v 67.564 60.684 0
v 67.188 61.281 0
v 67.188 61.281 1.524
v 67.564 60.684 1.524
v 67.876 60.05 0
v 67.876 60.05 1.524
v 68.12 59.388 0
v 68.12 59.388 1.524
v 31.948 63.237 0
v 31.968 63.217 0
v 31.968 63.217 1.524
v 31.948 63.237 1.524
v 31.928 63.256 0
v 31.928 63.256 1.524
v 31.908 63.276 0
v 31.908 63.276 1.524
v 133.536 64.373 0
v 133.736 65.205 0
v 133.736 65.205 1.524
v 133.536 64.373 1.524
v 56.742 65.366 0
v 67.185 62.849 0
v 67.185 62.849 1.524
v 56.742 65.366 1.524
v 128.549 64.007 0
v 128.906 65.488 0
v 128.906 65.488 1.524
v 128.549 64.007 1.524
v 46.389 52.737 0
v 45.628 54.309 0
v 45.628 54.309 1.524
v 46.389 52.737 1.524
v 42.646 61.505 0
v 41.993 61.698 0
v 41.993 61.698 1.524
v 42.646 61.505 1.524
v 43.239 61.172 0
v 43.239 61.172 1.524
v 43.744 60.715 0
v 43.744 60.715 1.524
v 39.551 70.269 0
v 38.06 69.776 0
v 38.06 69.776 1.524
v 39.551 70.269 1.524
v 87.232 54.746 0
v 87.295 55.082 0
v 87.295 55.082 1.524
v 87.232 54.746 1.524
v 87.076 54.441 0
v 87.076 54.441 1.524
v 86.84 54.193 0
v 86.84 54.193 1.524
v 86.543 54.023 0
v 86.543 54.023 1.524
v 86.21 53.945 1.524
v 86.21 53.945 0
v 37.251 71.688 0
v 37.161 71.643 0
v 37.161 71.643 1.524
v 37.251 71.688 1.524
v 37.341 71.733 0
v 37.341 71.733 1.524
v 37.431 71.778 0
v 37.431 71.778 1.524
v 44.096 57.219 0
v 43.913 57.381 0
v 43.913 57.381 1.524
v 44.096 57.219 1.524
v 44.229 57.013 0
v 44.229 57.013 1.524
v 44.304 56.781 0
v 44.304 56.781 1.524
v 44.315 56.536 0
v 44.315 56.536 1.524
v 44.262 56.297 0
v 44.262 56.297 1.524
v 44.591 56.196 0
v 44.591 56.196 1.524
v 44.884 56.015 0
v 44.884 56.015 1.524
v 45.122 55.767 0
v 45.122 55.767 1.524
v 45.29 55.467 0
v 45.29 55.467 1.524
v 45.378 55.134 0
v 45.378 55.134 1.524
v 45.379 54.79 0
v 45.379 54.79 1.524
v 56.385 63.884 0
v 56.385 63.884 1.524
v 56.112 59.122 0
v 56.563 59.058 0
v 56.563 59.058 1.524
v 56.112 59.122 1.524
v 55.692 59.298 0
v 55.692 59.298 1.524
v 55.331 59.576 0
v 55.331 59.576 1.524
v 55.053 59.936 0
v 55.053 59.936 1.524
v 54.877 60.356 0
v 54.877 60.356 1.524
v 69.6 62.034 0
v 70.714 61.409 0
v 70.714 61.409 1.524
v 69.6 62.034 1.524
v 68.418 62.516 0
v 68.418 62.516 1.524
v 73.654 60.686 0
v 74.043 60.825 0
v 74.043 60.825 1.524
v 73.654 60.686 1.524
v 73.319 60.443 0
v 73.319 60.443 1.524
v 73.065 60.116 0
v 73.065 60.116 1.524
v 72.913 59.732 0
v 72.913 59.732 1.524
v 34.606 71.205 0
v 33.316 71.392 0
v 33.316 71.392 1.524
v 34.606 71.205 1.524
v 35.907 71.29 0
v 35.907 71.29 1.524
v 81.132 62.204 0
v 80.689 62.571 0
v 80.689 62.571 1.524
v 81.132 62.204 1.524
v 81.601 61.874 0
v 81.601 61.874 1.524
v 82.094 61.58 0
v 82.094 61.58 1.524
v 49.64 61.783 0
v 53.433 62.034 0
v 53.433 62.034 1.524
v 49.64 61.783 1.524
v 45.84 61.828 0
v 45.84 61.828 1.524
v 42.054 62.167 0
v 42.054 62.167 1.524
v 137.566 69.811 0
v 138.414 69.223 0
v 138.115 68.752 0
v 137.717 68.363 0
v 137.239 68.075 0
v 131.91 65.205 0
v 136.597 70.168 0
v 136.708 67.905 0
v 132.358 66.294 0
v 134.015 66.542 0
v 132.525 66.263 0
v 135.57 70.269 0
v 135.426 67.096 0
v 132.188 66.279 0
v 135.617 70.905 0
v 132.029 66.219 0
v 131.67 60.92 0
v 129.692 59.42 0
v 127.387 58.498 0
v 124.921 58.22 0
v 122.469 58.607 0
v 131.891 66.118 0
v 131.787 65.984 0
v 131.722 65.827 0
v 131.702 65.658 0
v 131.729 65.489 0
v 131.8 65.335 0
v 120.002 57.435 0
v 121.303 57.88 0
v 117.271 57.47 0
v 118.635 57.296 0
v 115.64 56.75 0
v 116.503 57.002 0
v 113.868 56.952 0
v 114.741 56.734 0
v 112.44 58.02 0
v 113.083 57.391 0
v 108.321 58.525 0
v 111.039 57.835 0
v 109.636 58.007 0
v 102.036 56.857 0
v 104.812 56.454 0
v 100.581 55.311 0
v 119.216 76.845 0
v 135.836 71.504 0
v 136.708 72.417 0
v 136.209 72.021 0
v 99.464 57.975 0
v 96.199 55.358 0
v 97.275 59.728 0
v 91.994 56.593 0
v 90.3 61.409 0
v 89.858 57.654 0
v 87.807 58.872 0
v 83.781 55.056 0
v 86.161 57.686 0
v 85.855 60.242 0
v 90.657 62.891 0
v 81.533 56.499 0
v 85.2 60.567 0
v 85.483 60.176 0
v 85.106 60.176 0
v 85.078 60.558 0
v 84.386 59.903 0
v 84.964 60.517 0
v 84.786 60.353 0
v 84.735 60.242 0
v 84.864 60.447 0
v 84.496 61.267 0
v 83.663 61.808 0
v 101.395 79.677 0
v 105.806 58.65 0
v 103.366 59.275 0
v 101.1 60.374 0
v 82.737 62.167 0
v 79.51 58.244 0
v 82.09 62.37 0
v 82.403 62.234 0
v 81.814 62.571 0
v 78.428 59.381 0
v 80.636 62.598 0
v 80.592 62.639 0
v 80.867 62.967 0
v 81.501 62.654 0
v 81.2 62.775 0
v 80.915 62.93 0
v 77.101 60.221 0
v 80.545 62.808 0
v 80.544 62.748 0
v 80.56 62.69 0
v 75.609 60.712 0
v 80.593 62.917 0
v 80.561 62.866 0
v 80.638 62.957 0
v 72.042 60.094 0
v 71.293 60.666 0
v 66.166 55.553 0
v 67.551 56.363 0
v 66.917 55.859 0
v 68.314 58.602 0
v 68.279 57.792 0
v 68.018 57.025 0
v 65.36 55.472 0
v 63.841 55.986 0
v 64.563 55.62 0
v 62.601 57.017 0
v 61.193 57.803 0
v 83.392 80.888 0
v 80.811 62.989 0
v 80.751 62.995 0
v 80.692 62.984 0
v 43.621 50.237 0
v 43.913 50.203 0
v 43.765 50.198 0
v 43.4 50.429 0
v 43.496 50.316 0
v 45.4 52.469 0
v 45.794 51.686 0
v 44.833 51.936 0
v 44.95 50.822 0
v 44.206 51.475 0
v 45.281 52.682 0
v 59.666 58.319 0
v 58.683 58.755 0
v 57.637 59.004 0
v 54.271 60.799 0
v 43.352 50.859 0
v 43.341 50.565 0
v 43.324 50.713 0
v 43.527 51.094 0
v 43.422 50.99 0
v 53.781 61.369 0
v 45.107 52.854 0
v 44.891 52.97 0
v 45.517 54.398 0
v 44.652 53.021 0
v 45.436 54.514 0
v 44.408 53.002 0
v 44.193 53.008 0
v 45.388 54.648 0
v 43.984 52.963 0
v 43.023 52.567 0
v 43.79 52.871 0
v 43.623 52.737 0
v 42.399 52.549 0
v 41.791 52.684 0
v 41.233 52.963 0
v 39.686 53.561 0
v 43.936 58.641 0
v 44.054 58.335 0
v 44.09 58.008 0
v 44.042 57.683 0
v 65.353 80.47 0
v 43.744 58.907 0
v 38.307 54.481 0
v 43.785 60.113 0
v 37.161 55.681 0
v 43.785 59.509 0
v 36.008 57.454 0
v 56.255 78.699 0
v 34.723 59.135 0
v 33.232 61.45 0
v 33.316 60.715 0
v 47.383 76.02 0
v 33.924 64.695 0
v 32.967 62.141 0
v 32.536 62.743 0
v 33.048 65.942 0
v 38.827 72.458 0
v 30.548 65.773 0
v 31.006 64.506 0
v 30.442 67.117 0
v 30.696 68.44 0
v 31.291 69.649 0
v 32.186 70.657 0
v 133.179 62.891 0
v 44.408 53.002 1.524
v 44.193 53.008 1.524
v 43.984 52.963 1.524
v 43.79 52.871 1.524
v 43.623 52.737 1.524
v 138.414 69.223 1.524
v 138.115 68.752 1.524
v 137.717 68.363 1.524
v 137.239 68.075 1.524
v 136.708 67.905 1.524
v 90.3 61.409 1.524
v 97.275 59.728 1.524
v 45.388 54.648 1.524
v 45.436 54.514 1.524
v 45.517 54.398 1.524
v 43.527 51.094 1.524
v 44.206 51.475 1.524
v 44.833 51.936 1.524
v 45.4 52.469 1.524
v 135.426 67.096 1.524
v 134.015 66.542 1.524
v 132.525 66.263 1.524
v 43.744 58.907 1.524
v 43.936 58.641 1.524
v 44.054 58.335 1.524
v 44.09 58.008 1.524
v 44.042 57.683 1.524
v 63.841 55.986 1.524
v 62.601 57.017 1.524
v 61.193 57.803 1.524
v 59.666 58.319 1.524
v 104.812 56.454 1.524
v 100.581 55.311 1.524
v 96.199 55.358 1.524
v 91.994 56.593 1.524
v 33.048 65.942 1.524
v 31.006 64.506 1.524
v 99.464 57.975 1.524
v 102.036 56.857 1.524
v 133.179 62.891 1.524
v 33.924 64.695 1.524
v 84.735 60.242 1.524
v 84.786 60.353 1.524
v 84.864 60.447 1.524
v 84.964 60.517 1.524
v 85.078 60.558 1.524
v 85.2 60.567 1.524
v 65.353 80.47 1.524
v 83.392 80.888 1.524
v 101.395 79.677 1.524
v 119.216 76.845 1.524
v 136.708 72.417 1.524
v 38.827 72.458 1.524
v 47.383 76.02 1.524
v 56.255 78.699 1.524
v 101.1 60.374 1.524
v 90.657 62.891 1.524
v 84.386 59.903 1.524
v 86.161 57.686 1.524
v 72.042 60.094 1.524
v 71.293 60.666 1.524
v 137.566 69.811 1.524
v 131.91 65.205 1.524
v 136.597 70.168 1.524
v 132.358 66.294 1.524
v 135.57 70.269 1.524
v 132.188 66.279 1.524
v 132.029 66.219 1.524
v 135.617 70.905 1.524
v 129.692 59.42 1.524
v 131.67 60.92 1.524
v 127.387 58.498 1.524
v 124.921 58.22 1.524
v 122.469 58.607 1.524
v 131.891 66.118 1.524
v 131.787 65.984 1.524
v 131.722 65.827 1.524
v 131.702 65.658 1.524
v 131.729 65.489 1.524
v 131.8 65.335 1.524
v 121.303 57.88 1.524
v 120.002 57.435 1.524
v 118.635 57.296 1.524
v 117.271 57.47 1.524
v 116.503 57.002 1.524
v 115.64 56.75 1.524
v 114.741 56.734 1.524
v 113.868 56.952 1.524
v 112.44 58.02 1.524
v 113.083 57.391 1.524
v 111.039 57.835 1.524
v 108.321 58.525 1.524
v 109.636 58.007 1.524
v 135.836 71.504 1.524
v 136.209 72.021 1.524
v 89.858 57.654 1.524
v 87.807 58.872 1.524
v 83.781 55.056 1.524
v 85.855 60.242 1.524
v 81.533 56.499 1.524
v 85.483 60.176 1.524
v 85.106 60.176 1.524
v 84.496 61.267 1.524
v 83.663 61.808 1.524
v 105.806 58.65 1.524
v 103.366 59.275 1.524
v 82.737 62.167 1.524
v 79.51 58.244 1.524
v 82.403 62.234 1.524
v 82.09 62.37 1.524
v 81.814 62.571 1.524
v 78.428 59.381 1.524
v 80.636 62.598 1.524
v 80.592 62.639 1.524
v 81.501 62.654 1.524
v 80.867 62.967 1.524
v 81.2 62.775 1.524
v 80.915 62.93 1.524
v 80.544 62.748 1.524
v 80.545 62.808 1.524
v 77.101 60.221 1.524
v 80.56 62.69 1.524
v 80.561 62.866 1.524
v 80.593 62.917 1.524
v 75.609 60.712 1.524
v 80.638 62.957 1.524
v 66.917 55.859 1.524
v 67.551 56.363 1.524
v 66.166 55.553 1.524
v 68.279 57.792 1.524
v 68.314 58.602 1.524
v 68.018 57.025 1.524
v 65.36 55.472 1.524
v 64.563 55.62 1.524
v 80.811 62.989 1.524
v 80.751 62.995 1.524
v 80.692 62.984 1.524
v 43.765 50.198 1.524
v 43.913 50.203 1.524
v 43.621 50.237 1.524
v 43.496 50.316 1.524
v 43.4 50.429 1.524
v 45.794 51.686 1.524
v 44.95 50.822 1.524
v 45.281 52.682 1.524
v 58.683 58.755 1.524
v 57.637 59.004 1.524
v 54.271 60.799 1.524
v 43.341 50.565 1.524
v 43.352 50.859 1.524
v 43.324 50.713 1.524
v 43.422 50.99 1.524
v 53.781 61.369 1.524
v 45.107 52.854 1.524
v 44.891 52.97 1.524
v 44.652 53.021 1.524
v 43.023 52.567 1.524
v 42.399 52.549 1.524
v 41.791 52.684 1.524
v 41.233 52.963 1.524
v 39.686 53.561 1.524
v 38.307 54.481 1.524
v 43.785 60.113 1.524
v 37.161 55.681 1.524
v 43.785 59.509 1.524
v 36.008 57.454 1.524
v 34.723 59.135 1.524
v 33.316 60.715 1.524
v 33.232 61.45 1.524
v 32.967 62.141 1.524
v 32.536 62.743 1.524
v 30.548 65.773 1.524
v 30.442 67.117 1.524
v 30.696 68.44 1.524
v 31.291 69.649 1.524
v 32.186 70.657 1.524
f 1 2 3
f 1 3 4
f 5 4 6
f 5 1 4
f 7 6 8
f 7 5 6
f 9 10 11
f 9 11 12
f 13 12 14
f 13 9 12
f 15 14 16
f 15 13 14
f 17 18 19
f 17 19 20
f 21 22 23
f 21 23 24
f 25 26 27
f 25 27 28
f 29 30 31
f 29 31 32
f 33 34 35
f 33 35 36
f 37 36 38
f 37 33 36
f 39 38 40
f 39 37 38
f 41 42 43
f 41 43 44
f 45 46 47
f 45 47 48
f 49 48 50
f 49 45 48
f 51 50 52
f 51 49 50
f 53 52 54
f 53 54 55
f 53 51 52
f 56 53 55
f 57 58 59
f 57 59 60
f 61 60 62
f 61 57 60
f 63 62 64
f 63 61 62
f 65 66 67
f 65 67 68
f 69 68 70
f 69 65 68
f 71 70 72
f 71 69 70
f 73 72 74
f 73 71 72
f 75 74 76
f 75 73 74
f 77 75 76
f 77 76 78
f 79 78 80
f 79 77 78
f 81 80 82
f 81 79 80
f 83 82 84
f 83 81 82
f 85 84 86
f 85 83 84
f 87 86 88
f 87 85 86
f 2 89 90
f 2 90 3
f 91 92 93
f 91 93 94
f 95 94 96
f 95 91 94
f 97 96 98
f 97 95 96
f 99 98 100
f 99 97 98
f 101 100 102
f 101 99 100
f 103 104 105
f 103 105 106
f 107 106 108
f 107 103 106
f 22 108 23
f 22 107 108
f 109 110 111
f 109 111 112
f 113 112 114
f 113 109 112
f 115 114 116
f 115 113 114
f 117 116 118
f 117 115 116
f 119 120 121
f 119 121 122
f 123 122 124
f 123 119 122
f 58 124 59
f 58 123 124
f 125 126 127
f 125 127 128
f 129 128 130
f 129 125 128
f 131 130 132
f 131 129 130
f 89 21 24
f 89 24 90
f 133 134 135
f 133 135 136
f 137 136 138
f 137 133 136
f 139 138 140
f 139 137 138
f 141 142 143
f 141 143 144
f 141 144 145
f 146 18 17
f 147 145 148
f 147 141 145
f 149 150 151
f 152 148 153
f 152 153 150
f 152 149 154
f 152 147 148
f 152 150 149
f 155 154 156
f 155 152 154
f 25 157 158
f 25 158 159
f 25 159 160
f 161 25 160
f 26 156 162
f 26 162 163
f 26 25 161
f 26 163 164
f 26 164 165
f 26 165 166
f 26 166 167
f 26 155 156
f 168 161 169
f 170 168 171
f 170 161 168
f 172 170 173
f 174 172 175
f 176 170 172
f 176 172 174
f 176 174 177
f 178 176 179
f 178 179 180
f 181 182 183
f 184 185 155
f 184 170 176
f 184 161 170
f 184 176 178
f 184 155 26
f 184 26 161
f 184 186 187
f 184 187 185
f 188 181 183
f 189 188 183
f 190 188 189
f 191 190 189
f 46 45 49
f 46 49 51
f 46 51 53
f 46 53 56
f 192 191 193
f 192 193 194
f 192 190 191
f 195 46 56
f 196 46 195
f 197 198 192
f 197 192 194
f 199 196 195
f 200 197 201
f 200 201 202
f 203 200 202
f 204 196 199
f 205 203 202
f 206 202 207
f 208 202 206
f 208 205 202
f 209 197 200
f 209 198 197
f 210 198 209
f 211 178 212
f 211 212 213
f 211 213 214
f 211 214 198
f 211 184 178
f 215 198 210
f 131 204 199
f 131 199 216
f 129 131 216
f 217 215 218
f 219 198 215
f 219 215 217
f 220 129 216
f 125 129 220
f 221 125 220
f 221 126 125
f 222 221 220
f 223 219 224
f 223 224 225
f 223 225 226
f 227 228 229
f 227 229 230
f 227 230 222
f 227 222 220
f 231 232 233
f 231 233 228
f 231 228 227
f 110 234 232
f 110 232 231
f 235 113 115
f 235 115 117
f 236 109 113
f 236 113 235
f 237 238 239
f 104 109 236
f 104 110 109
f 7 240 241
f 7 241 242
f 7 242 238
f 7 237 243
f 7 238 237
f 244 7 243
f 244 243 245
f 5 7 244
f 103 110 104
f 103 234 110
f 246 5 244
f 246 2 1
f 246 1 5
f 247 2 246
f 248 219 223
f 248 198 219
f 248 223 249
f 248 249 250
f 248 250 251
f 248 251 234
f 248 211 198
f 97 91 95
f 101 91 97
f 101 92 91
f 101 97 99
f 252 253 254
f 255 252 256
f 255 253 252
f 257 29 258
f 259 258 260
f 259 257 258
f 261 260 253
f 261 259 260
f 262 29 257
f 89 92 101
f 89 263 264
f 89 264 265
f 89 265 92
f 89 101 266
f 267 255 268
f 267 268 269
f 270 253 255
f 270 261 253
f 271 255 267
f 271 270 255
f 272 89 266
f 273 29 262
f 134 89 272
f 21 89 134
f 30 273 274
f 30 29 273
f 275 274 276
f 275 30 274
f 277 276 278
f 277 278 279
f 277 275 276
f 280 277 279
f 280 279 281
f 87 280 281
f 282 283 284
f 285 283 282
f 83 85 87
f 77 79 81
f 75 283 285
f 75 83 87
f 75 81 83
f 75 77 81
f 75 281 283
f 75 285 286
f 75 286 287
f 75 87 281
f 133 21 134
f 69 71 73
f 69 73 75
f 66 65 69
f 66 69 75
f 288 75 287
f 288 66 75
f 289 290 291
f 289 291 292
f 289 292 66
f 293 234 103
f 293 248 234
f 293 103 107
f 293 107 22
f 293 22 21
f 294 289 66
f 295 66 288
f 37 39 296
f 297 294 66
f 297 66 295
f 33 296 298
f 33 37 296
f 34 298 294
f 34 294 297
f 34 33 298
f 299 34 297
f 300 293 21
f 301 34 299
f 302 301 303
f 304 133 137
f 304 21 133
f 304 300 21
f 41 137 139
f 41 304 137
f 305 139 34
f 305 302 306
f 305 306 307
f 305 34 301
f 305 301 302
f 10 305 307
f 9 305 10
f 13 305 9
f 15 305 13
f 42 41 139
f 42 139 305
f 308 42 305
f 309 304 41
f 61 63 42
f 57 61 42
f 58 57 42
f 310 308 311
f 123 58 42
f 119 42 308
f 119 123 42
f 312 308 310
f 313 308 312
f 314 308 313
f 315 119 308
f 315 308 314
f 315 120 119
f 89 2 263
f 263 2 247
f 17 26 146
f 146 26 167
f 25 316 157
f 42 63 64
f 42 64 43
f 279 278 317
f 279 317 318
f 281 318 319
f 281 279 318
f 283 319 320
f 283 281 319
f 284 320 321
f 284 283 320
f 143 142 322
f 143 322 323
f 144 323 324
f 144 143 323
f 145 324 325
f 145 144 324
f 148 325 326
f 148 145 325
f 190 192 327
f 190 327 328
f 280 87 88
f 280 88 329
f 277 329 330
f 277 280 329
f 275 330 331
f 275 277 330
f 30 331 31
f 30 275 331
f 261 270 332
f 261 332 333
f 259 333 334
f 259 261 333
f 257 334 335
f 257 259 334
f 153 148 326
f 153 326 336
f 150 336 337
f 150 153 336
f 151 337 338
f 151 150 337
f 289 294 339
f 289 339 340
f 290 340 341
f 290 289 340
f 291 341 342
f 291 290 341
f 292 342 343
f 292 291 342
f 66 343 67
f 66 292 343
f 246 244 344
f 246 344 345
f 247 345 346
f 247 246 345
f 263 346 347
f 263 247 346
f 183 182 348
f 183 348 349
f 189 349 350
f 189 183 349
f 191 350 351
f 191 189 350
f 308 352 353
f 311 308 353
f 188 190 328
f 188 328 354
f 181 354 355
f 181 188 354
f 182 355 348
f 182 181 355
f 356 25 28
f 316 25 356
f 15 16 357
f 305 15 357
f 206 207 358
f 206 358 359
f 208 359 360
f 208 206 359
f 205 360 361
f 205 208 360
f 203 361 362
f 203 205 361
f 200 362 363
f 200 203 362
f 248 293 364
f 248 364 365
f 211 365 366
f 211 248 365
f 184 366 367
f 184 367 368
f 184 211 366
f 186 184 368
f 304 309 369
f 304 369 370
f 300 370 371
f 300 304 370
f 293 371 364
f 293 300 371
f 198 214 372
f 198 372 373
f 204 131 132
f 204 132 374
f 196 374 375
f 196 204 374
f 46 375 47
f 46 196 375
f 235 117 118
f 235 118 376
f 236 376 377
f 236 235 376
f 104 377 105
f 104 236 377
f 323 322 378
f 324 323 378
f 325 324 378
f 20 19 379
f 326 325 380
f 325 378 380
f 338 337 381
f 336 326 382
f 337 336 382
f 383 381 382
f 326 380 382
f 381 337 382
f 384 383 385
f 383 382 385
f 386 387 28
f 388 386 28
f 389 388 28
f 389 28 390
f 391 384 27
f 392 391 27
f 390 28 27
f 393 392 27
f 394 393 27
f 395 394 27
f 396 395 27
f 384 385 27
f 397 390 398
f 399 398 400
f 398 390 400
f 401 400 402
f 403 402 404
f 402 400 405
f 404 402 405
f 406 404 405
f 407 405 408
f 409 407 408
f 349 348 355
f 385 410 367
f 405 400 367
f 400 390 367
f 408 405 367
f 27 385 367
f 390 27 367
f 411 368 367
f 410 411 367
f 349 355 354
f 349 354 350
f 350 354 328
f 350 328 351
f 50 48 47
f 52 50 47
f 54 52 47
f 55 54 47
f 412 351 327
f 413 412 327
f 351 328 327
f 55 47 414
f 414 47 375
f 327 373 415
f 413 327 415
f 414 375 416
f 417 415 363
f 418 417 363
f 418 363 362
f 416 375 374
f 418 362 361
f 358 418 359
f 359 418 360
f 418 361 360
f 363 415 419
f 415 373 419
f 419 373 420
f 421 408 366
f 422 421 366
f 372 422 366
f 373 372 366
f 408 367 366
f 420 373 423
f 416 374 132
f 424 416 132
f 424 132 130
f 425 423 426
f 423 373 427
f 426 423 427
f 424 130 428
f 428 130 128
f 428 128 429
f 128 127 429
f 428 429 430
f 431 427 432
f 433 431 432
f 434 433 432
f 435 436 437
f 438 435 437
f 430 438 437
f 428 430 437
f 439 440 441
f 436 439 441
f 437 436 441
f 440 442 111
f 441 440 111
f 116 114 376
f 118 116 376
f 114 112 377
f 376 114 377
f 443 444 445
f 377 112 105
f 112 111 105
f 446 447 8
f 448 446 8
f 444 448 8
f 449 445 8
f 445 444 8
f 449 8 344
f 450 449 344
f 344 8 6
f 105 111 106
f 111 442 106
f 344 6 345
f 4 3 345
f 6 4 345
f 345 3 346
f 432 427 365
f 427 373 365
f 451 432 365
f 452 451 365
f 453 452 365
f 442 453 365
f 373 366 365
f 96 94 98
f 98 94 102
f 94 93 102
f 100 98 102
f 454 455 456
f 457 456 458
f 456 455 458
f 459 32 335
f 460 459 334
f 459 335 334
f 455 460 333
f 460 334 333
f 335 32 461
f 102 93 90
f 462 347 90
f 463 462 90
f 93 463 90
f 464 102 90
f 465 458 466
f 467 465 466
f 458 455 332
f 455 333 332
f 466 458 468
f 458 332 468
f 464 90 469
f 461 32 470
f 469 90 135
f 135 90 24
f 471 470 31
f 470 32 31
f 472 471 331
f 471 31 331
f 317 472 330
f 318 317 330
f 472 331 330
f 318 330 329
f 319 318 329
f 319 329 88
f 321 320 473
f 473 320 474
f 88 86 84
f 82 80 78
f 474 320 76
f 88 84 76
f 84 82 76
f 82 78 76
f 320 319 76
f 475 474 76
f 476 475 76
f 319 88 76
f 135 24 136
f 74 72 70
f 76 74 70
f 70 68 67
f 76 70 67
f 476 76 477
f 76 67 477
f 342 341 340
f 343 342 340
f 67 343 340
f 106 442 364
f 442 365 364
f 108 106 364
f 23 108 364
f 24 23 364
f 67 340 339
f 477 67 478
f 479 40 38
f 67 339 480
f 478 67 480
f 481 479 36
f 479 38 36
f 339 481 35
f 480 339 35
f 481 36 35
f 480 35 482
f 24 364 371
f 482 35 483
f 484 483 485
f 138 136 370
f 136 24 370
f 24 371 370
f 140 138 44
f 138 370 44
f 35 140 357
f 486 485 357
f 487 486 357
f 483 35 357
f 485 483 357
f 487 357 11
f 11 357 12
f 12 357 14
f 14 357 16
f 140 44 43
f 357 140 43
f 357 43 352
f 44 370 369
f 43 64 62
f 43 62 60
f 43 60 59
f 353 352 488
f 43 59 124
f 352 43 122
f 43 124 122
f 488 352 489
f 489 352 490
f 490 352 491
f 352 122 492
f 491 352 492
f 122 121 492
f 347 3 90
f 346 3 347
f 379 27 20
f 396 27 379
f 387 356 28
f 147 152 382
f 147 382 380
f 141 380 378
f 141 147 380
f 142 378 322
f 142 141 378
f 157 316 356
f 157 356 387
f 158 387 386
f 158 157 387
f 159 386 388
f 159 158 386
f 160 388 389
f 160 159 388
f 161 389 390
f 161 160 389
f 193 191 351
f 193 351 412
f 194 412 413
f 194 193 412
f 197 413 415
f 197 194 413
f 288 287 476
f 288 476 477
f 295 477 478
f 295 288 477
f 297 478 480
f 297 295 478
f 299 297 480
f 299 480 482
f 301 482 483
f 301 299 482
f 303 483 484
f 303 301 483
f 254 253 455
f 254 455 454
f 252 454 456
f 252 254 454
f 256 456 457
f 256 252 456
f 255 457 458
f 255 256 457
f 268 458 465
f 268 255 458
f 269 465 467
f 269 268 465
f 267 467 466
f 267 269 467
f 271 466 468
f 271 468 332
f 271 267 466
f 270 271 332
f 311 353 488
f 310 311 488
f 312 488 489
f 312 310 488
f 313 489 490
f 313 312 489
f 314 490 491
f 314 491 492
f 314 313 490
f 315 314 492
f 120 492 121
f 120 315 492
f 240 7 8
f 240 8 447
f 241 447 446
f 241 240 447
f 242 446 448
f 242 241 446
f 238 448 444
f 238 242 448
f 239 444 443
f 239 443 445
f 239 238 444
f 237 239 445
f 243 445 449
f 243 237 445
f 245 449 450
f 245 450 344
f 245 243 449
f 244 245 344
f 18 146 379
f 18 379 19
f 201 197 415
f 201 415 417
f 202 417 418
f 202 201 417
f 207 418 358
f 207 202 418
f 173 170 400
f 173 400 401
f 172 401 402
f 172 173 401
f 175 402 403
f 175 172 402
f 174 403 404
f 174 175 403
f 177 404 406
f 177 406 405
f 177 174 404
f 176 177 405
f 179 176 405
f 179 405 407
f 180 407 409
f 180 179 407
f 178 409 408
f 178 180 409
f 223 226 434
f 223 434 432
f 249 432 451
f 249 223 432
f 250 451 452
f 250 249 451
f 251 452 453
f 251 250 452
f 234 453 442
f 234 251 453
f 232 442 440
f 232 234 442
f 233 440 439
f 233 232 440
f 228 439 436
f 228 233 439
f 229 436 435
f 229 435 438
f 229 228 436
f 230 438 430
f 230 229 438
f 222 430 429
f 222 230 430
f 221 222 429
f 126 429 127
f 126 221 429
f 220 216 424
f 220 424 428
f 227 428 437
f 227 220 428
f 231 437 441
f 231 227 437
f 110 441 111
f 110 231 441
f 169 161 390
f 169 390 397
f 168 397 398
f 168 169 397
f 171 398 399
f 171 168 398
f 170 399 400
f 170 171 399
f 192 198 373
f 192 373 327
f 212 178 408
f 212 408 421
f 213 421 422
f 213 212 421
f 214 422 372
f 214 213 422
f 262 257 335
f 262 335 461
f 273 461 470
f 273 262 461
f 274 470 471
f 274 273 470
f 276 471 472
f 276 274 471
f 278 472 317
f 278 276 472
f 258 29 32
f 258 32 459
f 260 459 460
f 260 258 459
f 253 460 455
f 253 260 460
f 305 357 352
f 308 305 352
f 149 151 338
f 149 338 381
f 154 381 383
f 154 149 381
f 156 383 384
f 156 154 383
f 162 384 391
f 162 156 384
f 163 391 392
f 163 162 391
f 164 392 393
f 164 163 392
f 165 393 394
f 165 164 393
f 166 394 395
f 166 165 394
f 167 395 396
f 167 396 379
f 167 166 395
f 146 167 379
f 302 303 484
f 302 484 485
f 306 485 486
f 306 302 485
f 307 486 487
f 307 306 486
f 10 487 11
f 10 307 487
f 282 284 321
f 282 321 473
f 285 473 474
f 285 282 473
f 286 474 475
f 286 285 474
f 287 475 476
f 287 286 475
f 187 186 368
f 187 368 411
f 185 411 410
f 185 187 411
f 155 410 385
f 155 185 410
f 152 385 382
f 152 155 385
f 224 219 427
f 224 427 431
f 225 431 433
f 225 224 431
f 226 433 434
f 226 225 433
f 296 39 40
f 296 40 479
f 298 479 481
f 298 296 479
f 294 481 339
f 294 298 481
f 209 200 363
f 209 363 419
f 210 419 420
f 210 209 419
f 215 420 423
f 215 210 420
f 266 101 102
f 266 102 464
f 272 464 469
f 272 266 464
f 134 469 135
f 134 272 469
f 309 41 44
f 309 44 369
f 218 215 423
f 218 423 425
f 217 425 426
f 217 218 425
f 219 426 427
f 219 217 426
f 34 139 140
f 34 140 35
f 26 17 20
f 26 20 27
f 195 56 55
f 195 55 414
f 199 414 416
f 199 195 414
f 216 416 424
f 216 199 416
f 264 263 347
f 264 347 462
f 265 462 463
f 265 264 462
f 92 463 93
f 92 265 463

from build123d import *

# Parameters (mm, degrees)
BOSS_EXTRUDE1_DEPTH = 1.524
CUT_EXTRUDE1_DEPTH  = 1.524


with BuildPart() as part:
    # Sketch1 → Boss-Extrude1 (new body)
    with BuildSketch(Plane.XY):
        with BuildLine():
            Line((101.100291423, 60.374270727), (90.656589002, 62.891021845))
            Line((90.656589002, 62.891021845), (90.299552181, 61.409434619))
            Line((90.299552181, 61.409434619), (97.275281594, 59.728404837))
            ThreePointArc((97.275281594, 59.728404837), (100.712861052, 57.330103102), (104.811716554, 56.453640143))
            ThreePointArc((104.811716554, 56.453640143), (98.388387768, 55.183939277), (91.99420693, 56.593103707))
            ThreePointArc((91.99420693, 56.593103707), (88.820887917, 58.243640163), (85.854606826, 60.242489993))
            ThreePointArc((85.854606826, 60.242489993), (85.294961905, 60.16786255), (84.735316985, 60.242489993))
            ThreePointArc((84.735316985, 60.242489993), (84.911389048, 60.485248679), (85.199998696, 60.566720278))
            ThreePointArc((85.199998696, 60.566720278), (84.093704885, 61.559355838), (82.737345027, 62.167220368))
            ThreePointArc((82.737345027, 62.167220368), (82.242631079, 62.293353709), (81.813901616, 62.570558609))
            ThreePointArc((81.813901616, 62.570558609), (81.348307425, 62.709827468), (80.915148386, 62.930161332))
            ThreePointArc((80.915148386, 62.930161332), (80.575687035, 62.892592479), (80.689439461, 62.570558609))
            ThreePointArc((80.689439461, 62.570558609), (81.362910423, 62.034486044), (82.093679171, 61.579608074))
            ThreePointArc((82.093679171, 61.579608074), (85.34723108, 58.853595342), (87.294585764, 55.08204988))
            ThreePointArc((87.294585764, 55.08204988), (86.96715778, 54.308537604), (86.2100149, 53.944855072))
            ThreePointArc((86.2100149, 53.944855072), (82.631314085, 55.737501843), (79.510424358, 58.243640163))
            ThreePointArc((79.510424358, 58.243640163), (77.101022334, 60.220982956), (74.043252382, 60.8252557))
            ThreePointArc((74.043252382, 60.8252557), (73.319039981, 60.442919356), (72.912598281, 59.731955343))
            ThreePointArc((72.912598281, 59.731955343), (71.649210609, 60.355874406), (70.713564157, 61.409434619))
            ThreePointArc((70.713564157, 61.409434619), (69.01653018, 62.293413679), (67.185483534, 62.848941789))
            Line((67.185483534, 62.848941789), (56.741781112, 65.365692908))
            Line((56.741781112, 65.365692908), (56.384744292, 63.884105681))
            Line((56.384744292, 63.884105681), (67.187541645, 61.280818914))
            ThreePointArc((67.187541645, 61.280818914), (67.728064625, 60.371118212), (68.120097106, 59.388249456))
            ThreePointArc((68.120097106, 59.388249456), (67.25174991, 56.088088151), (63.840774779, 55.986401624))
            ThreePointArc((63.840774779, 55.986401624), (61.915192799, 57.442438875), (59.66587196, 58.319060916))
            ThreePointArc((59.66587196, 58.319060916), (58.165438165, 58.903580474), (56.56257634, 59.057848613))
            ThreePointArc((56.56257634, 59.057848613), (55.502751345, 59.425253798), (54.876523852, 60.355874406))
            ThreePointArc((54.876523852, 60.355874406), (54.009369491, 61.07018483), (53.432898123, 62.034486044))
            ThreePointArc((53.432898123, 62.034486044), (47.739513392, 61.768563203), (42.053880875, 62.167220368))
            Line((42.053880875, 62.167220368), (41.993373858, 61.698351986))
            ThreePointArc((41.993373858, 61.698351986), (42.952167328, 61.355476536), (43.743732957, 60.714951479))
            ThreePointArc((43.743732957, 60.714951479), (43.790697856, 59.811147629), (43.743732957, 58.907343779))
            ThreePointArc((43.743732957, 58.907343779), (44.082816136, 58.172570857), (43.912857263, 57.381380215))
            ThreePointArc((43.912857263, 57.381380215), (44.274457866, 56.899495102), (44.262024663, 56.297154937))
            ThreePointArc((44.262024663, 56.297154937), (45.122173078, 55.767110933), (45.378894328, 54.789923059))
            ThreePointArc((45.378894328, 54.789923059), (45.435502491, 54.514155378), (45.627787771, 54.308537604))
            Line((45.627787771, 54.308537604), (46.389355044, 52.737014998))
            ThreePointArc((46.389355044, 52.737014998), (45.400171695, 51.226760005), (43.912857263, 50.203407855))
            ThreePointArc((43.912857263, 50.203407855), (43.364944937, 50.495067499), (43.527258774, 51.094173069))
            ThreePointArc((43.527258774, 51.094173069), (44.526346213, 51.696095286), (45.400171695, 52.468698091))
            ThreePointArc((45.400171695, 52.468698091), (45.003045019, 52.919665256), (44.407834519, 53.00216035))
            ThreePointArc((44.407834519, 53.00216035), (43.983628759, 52.963097784), (43.622570614, 52.737014998))
            ThreePointArc((43.622570614, 52.737014998), (42.399406092, 52.548722507), (41.233267746, 52.963097784))
            ThreePointArc((41.233267746, 52.963097784), (38.971135138, 53.982911867), (37.161424671, 55.680619947))
            ThreePointArc((37.161424671, 55.680619947), (35.381305609, 58.306867343), (33.315602324, 60.714951479))
            ThreePointArc((33.315602324, 60.714951479), (32.966961663, 62.14091635), (31.968277944, 63.216814558))
            ThreePointArc((31.968277944, 63.216814558), (30.501031212, 67.657392256), (33.315602324, 71.392326356))
            ThreePointArc((33.315602324, 71.392326356), (35.258344298, 71.213317676), (37.161424671, 71.642940269))
            ThreePointArc((37.161424671, 71.642940269), (37.296342328, 71.710526901), (37.431371034, 71.777891398))
            Line((37.431371034, 71.777891398), (38.060215392, 69.775819105))
            Line((38.060215392, 69.775819105), (39.550898091, 70.269167956))
            Line((39.550898091, 70.269167956), (38.8265509, 72.457825788))
            ThreePointArc((38.8265509, 72.457825788), (51.785413467, 77.471627923), (65.35310261, 80.469650975))
            ThreePointArc((65.35310261, 80.469650975), (101.39539204, 79.676514857), (136.707899952, 72.416867675))
            ThreePointArc((136.707899952, 72.416867675), (135.835671661, 71.50364664), (135.569556588, 70.269167956))
            ThreePointArc((135.569556588, 70.269167956), (137.092541248, 70.02020814), (138.413889319, 69.223024009))
            ThreePointArc((138.413889319, 69.223024009), (137.71652772, 68.362597164), (136.707899952, 67.905084783))
            ThreePointArc((136.707899952, 67.905084783), (134.733670661, 66.785291795), (132.524956631, 66.262702129))
            ThreePointArc((132.524956631, 66.262702129), (131.786563313, 65.984146711), (131.909656731, 65.204617479))
            Line((131.909656731, 65.204617479), (133.736189305, 65.204617479))
            Line((133.736189305, 65.204617479), (133.535689712, 64.372609071))
            Line((133.535689712, 64.372609071), (128.90572963, 65.488349136))
            Line((128.90572963, 65.488349136), (128.54869281, 64.006761909))
            Line((128.54869281, 64.006761909), (133.178652891, 62.891021845))
            ThreePointArc((133.178652891, 62.891021845), (128.570754882, 58.881474634), (122.468796178, 58.60707916))
            ThreePointArc((122.468796178, 58.60707916), (120.00213942, 57.435104265), (117.271437866, 57.469596916))
            ThreePointArc((117.271437866, 57.469596916), (114.740756953, 56.73361331), (112.440279749, 58.01962357))
            ThreePointArc((112.440279749, 58.01962357), (110.332177288, 57.876927186), (108.32111158, 58.525057544))
            ThreePointArc((108.32111158, 58.525057544), (104.570140962, 58.900802388), (101.100291423, 60.374270727))
        make_face()
    extrude(amount=BOSS_EXTRUDE1_DEPTH)

    # Sketch2 → Cut-Extrude1 (cut)
    with BuildSketch(Plane.XY.offset(1.524)):
        Polygon((31.847119616, 63.233896416), (33.924472638, 64.695472423), (33.047527033, 65.941884236), (30.970174012, 64.480308228), align=None)
    extrude(amount=-CUT_EXTRUDE1_DEPTH, mode=Mode.SUBTRACT)


solid = part.part
